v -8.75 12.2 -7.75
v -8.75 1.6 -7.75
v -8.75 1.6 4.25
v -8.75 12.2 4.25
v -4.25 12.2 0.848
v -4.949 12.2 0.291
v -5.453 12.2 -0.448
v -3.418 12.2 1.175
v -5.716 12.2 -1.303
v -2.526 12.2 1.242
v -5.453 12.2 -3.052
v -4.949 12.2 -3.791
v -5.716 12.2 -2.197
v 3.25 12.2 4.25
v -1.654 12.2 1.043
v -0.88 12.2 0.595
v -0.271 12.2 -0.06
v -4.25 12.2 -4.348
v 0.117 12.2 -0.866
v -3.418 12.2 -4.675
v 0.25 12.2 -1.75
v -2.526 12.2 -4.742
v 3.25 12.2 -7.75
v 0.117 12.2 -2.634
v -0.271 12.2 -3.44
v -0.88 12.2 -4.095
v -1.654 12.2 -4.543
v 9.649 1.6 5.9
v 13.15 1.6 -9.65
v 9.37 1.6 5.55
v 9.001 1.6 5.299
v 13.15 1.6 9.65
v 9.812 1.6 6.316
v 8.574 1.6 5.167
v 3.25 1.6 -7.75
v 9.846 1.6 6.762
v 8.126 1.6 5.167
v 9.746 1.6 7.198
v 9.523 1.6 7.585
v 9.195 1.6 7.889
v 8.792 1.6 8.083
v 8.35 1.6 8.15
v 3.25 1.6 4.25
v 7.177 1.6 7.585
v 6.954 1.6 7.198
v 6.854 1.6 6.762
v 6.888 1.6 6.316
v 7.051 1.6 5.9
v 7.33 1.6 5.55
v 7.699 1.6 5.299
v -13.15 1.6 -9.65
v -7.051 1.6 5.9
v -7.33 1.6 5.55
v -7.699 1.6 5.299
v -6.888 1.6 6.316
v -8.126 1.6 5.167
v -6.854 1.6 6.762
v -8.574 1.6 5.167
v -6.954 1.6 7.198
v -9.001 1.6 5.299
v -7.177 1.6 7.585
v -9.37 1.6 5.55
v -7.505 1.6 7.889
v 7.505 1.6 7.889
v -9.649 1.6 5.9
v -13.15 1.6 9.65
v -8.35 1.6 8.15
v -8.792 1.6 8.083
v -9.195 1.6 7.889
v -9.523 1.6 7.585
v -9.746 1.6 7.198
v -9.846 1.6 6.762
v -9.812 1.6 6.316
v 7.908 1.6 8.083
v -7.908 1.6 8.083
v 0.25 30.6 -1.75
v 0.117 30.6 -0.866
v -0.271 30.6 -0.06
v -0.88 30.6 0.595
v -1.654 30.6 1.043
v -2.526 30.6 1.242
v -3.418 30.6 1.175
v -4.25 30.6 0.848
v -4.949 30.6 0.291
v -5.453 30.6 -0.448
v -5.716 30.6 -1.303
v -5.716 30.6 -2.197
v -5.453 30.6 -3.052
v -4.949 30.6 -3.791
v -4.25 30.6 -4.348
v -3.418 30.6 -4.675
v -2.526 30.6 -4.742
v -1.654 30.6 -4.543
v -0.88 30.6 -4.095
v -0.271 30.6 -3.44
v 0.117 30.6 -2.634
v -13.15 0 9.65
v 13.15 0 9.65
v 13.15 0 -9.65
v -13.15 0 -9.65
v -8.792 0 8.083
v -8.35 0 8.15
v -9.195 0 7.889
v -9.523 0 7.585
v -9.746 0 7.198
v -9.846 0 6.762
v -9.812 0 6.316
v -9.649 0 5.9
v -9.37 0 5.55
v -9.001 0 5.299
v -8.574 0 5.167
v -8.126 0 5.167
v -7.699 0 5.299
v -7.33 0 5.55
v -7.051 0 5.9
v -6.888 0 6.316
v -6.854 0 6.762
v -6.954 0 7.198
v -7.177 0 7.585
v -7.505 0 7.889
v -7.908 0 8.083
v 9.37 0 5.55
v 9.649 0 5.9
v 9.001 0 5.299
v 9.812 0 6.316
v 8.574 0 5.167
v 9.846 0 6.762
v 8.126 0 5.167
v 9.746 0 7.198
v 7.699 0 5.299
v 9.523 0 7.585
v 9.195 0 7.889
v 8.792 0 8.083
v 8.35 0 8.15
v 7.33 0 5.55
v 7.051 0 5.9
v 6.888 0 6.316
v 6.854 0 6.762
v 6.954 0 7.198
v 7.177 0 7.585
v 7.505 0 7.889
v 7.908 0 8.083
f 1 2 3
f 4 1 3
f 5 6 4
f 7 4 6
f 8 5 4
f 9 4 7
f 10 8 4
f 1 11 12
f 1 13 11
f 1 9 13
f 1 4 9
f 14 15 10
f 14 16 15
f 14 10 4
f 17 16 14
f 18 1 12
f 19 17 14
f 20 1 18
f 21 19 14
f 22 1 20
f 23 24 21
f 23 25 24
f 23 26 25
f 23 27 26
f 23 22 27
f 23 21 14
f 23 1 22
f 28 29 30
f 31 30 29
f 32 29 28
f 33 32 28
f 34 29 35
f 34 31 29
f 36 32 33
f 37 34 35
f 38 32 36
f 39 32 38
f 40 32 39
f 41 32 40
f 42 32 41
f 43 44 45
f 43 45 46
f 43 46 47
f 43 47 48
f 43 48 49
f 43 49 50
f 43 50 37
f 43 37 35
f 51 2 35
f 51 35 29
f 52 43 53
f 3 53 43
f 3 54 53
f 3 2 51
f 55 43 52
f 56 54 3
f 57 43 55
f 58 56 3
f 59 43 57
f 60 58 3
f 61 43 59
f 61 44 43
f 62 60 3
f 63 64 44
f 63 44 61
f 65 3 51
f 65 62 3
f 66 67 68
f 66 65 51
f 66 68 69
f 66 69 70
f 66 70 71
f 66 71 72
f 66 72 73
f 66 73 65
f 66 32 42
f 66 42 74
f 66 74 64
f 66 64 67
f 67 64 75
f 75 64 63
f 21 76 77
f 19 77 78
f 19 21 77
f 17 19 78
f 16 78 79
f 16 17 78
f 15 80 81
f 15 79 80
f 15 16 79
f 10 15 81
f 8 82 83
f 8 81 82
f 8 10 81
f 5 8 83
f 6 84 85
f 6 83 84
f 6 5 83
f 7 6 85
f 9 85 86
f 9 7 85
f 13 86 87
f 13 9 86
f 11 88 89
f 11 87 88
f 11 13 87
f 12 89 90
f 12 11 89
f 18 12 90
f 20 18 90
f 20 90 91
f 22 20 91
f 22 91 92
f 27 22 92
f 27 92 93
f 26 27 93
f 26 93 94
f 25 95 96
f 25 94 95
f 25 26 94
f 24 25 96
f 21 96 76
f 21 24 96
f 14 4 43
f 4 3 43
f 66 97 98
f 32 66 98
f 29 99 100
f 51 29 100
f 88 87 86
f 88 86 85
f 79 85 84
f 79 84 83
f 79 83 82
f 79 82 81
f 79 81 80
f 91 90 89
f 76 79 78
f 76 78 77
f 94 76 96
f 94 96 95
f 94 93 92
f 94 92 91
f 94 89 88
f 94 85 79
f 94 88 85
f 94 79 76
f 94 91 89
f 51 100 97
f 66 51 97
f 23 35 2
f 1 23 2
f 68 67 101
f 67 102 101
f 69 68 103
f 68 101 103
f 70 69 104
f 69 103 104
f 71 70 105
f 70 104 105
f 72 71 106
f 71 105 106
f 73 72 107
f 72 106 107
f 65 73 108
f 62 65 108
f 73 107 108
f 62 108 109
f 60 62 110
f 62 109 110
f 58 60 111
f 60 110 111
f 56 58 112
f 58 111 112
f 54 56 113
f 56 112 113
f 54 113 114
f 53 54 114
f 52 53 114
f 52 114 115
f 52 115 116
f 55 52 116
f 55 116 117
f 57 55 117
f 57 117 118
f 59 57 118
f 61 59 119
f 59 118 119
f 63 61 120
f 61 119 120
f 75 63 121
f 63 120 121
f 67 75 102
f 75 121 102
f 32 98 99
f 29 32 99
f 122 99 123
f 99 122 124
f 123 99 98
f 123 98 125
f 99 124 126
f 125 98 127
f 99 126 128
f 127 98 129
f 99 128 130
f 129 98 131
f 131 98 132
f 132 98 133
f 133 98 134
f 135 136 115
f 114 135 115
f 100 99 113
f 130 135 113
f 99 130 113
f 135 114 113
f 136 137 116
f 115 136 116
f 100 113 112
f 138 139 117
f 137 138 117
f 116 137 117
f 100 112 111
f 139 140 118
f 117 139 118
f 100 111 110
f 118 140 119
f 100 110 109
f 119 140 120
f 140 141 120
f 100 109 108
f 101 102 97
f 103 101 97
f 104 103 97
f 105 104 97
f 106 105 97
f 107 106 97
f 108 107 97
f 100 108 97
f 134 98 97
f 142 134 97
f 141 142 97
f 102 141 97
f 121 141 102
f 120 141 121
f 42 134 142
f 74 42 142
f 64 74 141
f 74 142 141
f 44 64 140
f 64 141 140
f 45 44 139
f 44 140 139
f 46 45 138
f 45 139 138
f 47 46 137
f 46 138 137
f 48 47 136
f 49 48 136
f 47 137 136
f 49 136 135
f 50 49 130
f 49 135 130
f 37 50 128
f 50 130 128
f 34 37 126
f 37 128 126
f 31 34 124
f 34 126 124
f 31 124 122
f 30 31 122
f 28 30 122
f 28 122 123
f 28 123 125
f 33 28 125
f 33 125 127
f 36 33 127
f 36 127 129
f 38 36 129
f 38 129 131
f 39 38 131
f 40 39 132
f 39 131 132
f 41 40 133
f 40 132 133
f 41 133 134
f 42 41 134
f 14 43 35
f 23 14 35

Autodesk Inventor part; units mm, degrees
ref_plane "YZ Plane" through (0, 0, 0) normal (1, 0, 0) x (0, 1, 0)
ref_plane "XZ Plane" through (0, 0, 0) normal (0, 1, 0) x (-1, 0, 0)
ref_plane "XY Plane" through (0, 0, 0) normal (0, 0, 1) x (1, 0, 0)
sketch "Sketch1" plane through (0, 0, 0) normal (0, 1, 0) x (-1, 0, 0)
  line L0 (13.15, 9.65) -> (-13.15, 9.65)
  line L1 (-13.15, 9.65) -> (-13.15, -9.65)
  line L2 (-13.15, -9.65) -> (13.15, -9.65)
  line L3 (13.15, -9.65) -> (13.15, 9.65)
  point P0 (0, 0)
  dimension "d0" = 19.3
  dimension "d1" = 26.3
  dimension "d2" = 9.65
  dimension "d3" = 13.15
extrude "Extrusion1" add sketch "Sketch1" along normal blind 1.6
sketch "Sketch2" plane through (0, 1.6, 0) normal (0, 1, 0) x (1, 0, 0)
  line L0 (-8.75, -4.25) -> (3.25, -4.25)
  line L1 (3.25, -4.25) -> (3.25, 7.75)
  line L2 (3.25, 7.75) -> (-8.75, 7.75)
  line L3 (-8.75, 7.75) -> (-8.75, -4.25)
  line L4 (13.15, 9.65) -> (-13.15, 9.65) projected
  line L5 (-13.15, 9.65) -> (-13.15, -9.65) projected
  point P0 (0, 0)
  dimension "d6" = 12
  dimension "d7" = 12
  dimension "d8" = 1.9
  dimension "d9" = 4.4
extrude "Extrusion2" add sketch "Sketch2" along normal blind 10.6
sketch "Sketch3" plane through (0, 12.2, 0) normal (0, 1, 0) x (1, 0, 0)
  circle A0 centre (-2.75, 1.75) radius 3
  line L0 (-8.75, 7.75) -> (-8.75, -4.25) projected
  line L1 (3.25, 7.75) -> (-8.75, 7.75) projected
  point P0 (0, 0)
  dimension "d12" = 6
  dimension "d13" = 6
  dimension "d14" = 6
extrude "Extrusion3" add sketch "Sketch3" along normal blind 18.4
sketch "Sketch4" plane through (0, 1.6, 0) normal (0, 1, 0) x (1, 0, 0)
  line L0 (-13.15, -9.65) -> (13.15, -9.65) projected
  line L1 (13.15, -9.65) -> (13.15, 9.65) projected
  line L2 (-13.15, 9.65) -> (-13.15, -9.65) projected
  point P0 (0, 0)
  point P1 (-8.35, -6.65)
  point P2 (8.35, -6.65)
  dimension "d17" = 3
  dimension "d18" = 4.8
  dimension "d19" = 4.8
hole "Hole1" at (-8.35, 1.6, 6.65) at (8.35, 1.6, 6.65) direction (0, -1, 0) diameter 2 end through all counterbore diameter 3 counterbore depth 2
properties part number "Rotary_Encoder_Model"
